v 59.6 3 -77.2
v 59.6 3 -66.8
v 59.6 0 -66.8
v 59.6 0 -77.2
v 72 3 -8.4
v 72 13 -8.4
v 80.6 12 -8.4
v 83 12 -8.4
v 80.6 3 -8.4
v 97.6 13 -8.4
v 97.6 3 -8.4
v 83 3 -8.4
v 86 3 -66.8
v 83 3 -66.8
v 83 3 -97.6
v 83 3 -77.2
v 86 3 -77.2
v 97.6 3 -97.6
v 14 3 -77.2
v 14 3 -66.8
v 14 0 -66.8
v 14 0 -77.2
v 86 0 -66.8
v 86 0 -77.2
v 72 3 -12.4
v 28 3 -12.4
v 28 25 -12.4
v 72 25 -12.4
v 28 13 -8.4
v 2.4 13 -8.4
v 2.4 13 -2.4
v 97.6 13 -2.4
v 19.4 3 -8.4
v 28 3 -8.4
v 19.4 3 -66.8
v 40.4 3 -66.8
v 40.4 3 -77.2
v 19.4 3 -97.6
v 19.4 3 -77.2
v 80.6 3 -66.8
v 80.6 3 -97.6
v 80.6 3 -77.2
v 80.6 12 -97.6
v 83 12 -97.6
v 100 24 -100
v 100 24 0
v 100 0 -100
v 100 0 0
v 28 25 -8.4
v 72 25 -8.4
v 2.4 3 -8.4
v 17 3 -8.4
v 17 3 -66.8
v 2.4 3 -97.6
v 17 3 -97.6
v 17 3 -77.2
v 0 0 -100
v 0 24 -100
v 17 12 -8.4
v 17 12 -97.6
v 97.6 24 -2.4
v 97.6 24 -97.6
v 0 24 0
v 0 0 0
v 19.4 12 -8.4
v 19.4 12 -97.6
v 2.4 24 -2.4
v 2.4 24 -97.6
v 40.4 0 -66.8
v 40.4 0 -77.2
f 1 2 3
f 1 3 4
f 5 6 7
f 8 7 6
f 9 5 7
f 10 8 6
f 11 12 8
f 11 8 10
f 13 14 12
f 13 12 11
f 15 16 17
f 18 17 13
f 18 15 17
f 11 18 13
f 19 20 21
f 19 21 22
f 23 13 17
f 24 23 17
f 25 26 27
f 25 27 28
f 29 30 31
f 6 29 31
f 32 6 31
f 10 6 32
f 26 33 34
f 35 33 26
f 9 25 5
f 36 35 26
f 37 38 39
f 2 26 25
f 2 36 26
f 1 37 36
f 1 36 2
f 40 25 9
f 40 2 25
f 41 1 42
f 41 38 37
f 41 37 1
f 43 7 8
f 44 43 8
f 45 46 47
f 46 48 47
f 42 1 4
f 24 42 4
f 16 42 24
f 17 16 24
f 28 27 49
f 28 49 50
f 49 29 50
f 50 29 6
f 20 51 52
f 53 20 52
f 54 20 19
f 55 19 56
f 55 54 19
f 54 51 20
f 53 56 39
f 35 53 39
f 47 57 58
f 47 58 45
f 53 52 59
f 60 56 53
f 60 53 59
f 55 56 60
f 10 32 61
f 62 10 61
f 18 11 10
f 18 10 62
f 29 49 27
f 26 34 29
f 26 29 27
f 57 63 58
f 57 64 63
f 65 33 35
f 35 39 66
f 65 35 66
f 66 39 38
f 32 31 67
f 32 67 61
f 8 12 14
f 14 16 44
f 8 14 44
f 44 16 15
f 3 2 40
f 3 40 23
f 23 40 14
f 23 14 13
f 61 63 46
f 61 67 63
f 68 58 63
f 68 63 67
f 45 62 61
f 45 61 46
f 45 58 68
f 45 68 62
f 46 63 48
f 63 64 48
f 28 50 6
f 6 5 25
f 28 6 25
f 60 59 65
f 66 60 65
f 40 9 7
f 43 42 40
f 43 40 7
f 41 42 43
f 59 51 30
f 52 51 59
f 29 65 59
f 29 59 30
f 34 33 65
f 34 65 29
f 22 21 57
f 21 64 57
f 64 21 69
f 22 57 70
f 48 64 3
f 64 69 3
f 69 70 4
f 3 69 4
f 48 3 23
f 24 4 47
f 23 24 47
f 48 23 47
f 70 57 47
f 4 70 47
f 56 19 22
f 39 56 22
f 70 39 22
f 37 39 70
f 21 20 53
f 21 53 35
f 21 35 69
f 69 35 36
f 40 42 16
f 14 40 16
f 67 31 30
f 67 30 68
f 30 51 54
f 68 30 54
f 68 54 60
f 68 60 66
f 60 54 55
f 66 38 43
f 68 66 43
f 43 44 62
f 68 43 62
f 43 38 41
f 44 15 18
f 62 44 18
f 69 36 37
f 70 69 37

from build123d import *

# Parameters (mm, degrees)
CROQUIS1_W              = 100
CROQUIS1_H              = 100
PLACABASE_DEPTH         = 3
CROQUIS2_W              = 100
CROQUIS2_H              = 100
CROQUIS2_W_2            = 95.2
CROQUIS2_H_2            = 95.2
PAREDES_DEPTH           = 21
CROQUIS4_W              = 26.4
CROQUIS4_H              = 10.4
ALOJAMIENTOSMOTOR_DEPTH = 12.4
CROQUIS6_W              = 2.4
CROQUIS6_H              = 95.2
NERVIOSRIGIDEZ_DEPTH    = 9
CROQUIS7_W              = 95.2
CROQUIS7_H              = 6
BLOQUECUNA_DEPTH        = 10
CROQUIS8_W              = 44
CROQUIS8_H              = 4
TORRESENSORES_DEPTH     = 22


with BuildPart() as part:
    # Croquis1 → PlacaBase (new body)
    with BuildSketch(Plane(origin=(0, 0, 0), x_dir=(1, 0, 0), z_dir=(0, 1, 0))):
        with Locations((50, 50)):
            Rectangle(CROQUIS1_W, CROQUIS1_H)
    extrude(amount=PLACABASE_DEPTH)

    # Croquis2 → Paredes (add)
    with BuildSketch(Plane(origin=(0, 3, 0), x_dir=(1, 0, 0), z_dir=(0, 1, 0))):
        with Locations((50, 50)):
            Rectangle(CROQUIS2_W, CROQUIS2_H)
        with Locations((50, 50)):
            Rectangle(CROQUIS2_W_2, CROQUIS2_H_2, mode=Mode.SUBTRACT)
    extrude(amount=PAREDES_DEPTH)

    # Croquis4 → AlojamientosMotor (cut)
    with BuildSketch(Plane(origin=(0, 7.3, 0), x_dir=(1, 0, 0), z_dir=(0, 1, 0))):
        with Locations((27.2, 72)):
            Rectangle(CROQUIS4_W, CROQUIS4_H)
        with Locations((72.8, 72)):
            Rectangle(CROQUIS4_W, CROQUIS4_H)
    extrude(amount=-ALOJAMIENTOSMOTOR_DEPTH, mode=Mode.SUBTRACT)

    # Croquis6 → NerviosRigidez (add)
    with BuildSketch(Plane(origin=(0, 3, 0), x_dir=(1, 0, 0), z_dir=(0, 1, 0))):
        with Locations((18.2, 50)):
            Rectangle(CROQUIS6_W, CROQUIS6_H)
        with Locations((81.8, 50)):
            Rectangle(CROQUIS6_W, CROQUIS6_H)
    extrude(amount=NERVIOSRIGIDEZ_DEPTH)

    # Croquis7 → BloqueCuna (add)
    with BuildSketch(Plane(origin=(0, 3, 0), x_dir=(1, 0, 0), z_dir=(0, 1, 0))):
        with Locations((50, 5.4)):
            Rectangle(CROQUIS7_W, CROQUIS7_H)
    extrude(amount=BLOQUECUNA_DEPTH)

    # Croquis8 → TorreSensores (add)
    with BuildSketch(Plane(origin=(0, 3, 0), x_dir=(1, 0, 0), z_dir=(0, 1, 0))):
        with Locations((50, 10.4)):
            Rectangle(CROQUIS8_W, CROQUIS8_H)
    extrude(amount=TORRESENSORES_DEPTH)


solid = part.part
